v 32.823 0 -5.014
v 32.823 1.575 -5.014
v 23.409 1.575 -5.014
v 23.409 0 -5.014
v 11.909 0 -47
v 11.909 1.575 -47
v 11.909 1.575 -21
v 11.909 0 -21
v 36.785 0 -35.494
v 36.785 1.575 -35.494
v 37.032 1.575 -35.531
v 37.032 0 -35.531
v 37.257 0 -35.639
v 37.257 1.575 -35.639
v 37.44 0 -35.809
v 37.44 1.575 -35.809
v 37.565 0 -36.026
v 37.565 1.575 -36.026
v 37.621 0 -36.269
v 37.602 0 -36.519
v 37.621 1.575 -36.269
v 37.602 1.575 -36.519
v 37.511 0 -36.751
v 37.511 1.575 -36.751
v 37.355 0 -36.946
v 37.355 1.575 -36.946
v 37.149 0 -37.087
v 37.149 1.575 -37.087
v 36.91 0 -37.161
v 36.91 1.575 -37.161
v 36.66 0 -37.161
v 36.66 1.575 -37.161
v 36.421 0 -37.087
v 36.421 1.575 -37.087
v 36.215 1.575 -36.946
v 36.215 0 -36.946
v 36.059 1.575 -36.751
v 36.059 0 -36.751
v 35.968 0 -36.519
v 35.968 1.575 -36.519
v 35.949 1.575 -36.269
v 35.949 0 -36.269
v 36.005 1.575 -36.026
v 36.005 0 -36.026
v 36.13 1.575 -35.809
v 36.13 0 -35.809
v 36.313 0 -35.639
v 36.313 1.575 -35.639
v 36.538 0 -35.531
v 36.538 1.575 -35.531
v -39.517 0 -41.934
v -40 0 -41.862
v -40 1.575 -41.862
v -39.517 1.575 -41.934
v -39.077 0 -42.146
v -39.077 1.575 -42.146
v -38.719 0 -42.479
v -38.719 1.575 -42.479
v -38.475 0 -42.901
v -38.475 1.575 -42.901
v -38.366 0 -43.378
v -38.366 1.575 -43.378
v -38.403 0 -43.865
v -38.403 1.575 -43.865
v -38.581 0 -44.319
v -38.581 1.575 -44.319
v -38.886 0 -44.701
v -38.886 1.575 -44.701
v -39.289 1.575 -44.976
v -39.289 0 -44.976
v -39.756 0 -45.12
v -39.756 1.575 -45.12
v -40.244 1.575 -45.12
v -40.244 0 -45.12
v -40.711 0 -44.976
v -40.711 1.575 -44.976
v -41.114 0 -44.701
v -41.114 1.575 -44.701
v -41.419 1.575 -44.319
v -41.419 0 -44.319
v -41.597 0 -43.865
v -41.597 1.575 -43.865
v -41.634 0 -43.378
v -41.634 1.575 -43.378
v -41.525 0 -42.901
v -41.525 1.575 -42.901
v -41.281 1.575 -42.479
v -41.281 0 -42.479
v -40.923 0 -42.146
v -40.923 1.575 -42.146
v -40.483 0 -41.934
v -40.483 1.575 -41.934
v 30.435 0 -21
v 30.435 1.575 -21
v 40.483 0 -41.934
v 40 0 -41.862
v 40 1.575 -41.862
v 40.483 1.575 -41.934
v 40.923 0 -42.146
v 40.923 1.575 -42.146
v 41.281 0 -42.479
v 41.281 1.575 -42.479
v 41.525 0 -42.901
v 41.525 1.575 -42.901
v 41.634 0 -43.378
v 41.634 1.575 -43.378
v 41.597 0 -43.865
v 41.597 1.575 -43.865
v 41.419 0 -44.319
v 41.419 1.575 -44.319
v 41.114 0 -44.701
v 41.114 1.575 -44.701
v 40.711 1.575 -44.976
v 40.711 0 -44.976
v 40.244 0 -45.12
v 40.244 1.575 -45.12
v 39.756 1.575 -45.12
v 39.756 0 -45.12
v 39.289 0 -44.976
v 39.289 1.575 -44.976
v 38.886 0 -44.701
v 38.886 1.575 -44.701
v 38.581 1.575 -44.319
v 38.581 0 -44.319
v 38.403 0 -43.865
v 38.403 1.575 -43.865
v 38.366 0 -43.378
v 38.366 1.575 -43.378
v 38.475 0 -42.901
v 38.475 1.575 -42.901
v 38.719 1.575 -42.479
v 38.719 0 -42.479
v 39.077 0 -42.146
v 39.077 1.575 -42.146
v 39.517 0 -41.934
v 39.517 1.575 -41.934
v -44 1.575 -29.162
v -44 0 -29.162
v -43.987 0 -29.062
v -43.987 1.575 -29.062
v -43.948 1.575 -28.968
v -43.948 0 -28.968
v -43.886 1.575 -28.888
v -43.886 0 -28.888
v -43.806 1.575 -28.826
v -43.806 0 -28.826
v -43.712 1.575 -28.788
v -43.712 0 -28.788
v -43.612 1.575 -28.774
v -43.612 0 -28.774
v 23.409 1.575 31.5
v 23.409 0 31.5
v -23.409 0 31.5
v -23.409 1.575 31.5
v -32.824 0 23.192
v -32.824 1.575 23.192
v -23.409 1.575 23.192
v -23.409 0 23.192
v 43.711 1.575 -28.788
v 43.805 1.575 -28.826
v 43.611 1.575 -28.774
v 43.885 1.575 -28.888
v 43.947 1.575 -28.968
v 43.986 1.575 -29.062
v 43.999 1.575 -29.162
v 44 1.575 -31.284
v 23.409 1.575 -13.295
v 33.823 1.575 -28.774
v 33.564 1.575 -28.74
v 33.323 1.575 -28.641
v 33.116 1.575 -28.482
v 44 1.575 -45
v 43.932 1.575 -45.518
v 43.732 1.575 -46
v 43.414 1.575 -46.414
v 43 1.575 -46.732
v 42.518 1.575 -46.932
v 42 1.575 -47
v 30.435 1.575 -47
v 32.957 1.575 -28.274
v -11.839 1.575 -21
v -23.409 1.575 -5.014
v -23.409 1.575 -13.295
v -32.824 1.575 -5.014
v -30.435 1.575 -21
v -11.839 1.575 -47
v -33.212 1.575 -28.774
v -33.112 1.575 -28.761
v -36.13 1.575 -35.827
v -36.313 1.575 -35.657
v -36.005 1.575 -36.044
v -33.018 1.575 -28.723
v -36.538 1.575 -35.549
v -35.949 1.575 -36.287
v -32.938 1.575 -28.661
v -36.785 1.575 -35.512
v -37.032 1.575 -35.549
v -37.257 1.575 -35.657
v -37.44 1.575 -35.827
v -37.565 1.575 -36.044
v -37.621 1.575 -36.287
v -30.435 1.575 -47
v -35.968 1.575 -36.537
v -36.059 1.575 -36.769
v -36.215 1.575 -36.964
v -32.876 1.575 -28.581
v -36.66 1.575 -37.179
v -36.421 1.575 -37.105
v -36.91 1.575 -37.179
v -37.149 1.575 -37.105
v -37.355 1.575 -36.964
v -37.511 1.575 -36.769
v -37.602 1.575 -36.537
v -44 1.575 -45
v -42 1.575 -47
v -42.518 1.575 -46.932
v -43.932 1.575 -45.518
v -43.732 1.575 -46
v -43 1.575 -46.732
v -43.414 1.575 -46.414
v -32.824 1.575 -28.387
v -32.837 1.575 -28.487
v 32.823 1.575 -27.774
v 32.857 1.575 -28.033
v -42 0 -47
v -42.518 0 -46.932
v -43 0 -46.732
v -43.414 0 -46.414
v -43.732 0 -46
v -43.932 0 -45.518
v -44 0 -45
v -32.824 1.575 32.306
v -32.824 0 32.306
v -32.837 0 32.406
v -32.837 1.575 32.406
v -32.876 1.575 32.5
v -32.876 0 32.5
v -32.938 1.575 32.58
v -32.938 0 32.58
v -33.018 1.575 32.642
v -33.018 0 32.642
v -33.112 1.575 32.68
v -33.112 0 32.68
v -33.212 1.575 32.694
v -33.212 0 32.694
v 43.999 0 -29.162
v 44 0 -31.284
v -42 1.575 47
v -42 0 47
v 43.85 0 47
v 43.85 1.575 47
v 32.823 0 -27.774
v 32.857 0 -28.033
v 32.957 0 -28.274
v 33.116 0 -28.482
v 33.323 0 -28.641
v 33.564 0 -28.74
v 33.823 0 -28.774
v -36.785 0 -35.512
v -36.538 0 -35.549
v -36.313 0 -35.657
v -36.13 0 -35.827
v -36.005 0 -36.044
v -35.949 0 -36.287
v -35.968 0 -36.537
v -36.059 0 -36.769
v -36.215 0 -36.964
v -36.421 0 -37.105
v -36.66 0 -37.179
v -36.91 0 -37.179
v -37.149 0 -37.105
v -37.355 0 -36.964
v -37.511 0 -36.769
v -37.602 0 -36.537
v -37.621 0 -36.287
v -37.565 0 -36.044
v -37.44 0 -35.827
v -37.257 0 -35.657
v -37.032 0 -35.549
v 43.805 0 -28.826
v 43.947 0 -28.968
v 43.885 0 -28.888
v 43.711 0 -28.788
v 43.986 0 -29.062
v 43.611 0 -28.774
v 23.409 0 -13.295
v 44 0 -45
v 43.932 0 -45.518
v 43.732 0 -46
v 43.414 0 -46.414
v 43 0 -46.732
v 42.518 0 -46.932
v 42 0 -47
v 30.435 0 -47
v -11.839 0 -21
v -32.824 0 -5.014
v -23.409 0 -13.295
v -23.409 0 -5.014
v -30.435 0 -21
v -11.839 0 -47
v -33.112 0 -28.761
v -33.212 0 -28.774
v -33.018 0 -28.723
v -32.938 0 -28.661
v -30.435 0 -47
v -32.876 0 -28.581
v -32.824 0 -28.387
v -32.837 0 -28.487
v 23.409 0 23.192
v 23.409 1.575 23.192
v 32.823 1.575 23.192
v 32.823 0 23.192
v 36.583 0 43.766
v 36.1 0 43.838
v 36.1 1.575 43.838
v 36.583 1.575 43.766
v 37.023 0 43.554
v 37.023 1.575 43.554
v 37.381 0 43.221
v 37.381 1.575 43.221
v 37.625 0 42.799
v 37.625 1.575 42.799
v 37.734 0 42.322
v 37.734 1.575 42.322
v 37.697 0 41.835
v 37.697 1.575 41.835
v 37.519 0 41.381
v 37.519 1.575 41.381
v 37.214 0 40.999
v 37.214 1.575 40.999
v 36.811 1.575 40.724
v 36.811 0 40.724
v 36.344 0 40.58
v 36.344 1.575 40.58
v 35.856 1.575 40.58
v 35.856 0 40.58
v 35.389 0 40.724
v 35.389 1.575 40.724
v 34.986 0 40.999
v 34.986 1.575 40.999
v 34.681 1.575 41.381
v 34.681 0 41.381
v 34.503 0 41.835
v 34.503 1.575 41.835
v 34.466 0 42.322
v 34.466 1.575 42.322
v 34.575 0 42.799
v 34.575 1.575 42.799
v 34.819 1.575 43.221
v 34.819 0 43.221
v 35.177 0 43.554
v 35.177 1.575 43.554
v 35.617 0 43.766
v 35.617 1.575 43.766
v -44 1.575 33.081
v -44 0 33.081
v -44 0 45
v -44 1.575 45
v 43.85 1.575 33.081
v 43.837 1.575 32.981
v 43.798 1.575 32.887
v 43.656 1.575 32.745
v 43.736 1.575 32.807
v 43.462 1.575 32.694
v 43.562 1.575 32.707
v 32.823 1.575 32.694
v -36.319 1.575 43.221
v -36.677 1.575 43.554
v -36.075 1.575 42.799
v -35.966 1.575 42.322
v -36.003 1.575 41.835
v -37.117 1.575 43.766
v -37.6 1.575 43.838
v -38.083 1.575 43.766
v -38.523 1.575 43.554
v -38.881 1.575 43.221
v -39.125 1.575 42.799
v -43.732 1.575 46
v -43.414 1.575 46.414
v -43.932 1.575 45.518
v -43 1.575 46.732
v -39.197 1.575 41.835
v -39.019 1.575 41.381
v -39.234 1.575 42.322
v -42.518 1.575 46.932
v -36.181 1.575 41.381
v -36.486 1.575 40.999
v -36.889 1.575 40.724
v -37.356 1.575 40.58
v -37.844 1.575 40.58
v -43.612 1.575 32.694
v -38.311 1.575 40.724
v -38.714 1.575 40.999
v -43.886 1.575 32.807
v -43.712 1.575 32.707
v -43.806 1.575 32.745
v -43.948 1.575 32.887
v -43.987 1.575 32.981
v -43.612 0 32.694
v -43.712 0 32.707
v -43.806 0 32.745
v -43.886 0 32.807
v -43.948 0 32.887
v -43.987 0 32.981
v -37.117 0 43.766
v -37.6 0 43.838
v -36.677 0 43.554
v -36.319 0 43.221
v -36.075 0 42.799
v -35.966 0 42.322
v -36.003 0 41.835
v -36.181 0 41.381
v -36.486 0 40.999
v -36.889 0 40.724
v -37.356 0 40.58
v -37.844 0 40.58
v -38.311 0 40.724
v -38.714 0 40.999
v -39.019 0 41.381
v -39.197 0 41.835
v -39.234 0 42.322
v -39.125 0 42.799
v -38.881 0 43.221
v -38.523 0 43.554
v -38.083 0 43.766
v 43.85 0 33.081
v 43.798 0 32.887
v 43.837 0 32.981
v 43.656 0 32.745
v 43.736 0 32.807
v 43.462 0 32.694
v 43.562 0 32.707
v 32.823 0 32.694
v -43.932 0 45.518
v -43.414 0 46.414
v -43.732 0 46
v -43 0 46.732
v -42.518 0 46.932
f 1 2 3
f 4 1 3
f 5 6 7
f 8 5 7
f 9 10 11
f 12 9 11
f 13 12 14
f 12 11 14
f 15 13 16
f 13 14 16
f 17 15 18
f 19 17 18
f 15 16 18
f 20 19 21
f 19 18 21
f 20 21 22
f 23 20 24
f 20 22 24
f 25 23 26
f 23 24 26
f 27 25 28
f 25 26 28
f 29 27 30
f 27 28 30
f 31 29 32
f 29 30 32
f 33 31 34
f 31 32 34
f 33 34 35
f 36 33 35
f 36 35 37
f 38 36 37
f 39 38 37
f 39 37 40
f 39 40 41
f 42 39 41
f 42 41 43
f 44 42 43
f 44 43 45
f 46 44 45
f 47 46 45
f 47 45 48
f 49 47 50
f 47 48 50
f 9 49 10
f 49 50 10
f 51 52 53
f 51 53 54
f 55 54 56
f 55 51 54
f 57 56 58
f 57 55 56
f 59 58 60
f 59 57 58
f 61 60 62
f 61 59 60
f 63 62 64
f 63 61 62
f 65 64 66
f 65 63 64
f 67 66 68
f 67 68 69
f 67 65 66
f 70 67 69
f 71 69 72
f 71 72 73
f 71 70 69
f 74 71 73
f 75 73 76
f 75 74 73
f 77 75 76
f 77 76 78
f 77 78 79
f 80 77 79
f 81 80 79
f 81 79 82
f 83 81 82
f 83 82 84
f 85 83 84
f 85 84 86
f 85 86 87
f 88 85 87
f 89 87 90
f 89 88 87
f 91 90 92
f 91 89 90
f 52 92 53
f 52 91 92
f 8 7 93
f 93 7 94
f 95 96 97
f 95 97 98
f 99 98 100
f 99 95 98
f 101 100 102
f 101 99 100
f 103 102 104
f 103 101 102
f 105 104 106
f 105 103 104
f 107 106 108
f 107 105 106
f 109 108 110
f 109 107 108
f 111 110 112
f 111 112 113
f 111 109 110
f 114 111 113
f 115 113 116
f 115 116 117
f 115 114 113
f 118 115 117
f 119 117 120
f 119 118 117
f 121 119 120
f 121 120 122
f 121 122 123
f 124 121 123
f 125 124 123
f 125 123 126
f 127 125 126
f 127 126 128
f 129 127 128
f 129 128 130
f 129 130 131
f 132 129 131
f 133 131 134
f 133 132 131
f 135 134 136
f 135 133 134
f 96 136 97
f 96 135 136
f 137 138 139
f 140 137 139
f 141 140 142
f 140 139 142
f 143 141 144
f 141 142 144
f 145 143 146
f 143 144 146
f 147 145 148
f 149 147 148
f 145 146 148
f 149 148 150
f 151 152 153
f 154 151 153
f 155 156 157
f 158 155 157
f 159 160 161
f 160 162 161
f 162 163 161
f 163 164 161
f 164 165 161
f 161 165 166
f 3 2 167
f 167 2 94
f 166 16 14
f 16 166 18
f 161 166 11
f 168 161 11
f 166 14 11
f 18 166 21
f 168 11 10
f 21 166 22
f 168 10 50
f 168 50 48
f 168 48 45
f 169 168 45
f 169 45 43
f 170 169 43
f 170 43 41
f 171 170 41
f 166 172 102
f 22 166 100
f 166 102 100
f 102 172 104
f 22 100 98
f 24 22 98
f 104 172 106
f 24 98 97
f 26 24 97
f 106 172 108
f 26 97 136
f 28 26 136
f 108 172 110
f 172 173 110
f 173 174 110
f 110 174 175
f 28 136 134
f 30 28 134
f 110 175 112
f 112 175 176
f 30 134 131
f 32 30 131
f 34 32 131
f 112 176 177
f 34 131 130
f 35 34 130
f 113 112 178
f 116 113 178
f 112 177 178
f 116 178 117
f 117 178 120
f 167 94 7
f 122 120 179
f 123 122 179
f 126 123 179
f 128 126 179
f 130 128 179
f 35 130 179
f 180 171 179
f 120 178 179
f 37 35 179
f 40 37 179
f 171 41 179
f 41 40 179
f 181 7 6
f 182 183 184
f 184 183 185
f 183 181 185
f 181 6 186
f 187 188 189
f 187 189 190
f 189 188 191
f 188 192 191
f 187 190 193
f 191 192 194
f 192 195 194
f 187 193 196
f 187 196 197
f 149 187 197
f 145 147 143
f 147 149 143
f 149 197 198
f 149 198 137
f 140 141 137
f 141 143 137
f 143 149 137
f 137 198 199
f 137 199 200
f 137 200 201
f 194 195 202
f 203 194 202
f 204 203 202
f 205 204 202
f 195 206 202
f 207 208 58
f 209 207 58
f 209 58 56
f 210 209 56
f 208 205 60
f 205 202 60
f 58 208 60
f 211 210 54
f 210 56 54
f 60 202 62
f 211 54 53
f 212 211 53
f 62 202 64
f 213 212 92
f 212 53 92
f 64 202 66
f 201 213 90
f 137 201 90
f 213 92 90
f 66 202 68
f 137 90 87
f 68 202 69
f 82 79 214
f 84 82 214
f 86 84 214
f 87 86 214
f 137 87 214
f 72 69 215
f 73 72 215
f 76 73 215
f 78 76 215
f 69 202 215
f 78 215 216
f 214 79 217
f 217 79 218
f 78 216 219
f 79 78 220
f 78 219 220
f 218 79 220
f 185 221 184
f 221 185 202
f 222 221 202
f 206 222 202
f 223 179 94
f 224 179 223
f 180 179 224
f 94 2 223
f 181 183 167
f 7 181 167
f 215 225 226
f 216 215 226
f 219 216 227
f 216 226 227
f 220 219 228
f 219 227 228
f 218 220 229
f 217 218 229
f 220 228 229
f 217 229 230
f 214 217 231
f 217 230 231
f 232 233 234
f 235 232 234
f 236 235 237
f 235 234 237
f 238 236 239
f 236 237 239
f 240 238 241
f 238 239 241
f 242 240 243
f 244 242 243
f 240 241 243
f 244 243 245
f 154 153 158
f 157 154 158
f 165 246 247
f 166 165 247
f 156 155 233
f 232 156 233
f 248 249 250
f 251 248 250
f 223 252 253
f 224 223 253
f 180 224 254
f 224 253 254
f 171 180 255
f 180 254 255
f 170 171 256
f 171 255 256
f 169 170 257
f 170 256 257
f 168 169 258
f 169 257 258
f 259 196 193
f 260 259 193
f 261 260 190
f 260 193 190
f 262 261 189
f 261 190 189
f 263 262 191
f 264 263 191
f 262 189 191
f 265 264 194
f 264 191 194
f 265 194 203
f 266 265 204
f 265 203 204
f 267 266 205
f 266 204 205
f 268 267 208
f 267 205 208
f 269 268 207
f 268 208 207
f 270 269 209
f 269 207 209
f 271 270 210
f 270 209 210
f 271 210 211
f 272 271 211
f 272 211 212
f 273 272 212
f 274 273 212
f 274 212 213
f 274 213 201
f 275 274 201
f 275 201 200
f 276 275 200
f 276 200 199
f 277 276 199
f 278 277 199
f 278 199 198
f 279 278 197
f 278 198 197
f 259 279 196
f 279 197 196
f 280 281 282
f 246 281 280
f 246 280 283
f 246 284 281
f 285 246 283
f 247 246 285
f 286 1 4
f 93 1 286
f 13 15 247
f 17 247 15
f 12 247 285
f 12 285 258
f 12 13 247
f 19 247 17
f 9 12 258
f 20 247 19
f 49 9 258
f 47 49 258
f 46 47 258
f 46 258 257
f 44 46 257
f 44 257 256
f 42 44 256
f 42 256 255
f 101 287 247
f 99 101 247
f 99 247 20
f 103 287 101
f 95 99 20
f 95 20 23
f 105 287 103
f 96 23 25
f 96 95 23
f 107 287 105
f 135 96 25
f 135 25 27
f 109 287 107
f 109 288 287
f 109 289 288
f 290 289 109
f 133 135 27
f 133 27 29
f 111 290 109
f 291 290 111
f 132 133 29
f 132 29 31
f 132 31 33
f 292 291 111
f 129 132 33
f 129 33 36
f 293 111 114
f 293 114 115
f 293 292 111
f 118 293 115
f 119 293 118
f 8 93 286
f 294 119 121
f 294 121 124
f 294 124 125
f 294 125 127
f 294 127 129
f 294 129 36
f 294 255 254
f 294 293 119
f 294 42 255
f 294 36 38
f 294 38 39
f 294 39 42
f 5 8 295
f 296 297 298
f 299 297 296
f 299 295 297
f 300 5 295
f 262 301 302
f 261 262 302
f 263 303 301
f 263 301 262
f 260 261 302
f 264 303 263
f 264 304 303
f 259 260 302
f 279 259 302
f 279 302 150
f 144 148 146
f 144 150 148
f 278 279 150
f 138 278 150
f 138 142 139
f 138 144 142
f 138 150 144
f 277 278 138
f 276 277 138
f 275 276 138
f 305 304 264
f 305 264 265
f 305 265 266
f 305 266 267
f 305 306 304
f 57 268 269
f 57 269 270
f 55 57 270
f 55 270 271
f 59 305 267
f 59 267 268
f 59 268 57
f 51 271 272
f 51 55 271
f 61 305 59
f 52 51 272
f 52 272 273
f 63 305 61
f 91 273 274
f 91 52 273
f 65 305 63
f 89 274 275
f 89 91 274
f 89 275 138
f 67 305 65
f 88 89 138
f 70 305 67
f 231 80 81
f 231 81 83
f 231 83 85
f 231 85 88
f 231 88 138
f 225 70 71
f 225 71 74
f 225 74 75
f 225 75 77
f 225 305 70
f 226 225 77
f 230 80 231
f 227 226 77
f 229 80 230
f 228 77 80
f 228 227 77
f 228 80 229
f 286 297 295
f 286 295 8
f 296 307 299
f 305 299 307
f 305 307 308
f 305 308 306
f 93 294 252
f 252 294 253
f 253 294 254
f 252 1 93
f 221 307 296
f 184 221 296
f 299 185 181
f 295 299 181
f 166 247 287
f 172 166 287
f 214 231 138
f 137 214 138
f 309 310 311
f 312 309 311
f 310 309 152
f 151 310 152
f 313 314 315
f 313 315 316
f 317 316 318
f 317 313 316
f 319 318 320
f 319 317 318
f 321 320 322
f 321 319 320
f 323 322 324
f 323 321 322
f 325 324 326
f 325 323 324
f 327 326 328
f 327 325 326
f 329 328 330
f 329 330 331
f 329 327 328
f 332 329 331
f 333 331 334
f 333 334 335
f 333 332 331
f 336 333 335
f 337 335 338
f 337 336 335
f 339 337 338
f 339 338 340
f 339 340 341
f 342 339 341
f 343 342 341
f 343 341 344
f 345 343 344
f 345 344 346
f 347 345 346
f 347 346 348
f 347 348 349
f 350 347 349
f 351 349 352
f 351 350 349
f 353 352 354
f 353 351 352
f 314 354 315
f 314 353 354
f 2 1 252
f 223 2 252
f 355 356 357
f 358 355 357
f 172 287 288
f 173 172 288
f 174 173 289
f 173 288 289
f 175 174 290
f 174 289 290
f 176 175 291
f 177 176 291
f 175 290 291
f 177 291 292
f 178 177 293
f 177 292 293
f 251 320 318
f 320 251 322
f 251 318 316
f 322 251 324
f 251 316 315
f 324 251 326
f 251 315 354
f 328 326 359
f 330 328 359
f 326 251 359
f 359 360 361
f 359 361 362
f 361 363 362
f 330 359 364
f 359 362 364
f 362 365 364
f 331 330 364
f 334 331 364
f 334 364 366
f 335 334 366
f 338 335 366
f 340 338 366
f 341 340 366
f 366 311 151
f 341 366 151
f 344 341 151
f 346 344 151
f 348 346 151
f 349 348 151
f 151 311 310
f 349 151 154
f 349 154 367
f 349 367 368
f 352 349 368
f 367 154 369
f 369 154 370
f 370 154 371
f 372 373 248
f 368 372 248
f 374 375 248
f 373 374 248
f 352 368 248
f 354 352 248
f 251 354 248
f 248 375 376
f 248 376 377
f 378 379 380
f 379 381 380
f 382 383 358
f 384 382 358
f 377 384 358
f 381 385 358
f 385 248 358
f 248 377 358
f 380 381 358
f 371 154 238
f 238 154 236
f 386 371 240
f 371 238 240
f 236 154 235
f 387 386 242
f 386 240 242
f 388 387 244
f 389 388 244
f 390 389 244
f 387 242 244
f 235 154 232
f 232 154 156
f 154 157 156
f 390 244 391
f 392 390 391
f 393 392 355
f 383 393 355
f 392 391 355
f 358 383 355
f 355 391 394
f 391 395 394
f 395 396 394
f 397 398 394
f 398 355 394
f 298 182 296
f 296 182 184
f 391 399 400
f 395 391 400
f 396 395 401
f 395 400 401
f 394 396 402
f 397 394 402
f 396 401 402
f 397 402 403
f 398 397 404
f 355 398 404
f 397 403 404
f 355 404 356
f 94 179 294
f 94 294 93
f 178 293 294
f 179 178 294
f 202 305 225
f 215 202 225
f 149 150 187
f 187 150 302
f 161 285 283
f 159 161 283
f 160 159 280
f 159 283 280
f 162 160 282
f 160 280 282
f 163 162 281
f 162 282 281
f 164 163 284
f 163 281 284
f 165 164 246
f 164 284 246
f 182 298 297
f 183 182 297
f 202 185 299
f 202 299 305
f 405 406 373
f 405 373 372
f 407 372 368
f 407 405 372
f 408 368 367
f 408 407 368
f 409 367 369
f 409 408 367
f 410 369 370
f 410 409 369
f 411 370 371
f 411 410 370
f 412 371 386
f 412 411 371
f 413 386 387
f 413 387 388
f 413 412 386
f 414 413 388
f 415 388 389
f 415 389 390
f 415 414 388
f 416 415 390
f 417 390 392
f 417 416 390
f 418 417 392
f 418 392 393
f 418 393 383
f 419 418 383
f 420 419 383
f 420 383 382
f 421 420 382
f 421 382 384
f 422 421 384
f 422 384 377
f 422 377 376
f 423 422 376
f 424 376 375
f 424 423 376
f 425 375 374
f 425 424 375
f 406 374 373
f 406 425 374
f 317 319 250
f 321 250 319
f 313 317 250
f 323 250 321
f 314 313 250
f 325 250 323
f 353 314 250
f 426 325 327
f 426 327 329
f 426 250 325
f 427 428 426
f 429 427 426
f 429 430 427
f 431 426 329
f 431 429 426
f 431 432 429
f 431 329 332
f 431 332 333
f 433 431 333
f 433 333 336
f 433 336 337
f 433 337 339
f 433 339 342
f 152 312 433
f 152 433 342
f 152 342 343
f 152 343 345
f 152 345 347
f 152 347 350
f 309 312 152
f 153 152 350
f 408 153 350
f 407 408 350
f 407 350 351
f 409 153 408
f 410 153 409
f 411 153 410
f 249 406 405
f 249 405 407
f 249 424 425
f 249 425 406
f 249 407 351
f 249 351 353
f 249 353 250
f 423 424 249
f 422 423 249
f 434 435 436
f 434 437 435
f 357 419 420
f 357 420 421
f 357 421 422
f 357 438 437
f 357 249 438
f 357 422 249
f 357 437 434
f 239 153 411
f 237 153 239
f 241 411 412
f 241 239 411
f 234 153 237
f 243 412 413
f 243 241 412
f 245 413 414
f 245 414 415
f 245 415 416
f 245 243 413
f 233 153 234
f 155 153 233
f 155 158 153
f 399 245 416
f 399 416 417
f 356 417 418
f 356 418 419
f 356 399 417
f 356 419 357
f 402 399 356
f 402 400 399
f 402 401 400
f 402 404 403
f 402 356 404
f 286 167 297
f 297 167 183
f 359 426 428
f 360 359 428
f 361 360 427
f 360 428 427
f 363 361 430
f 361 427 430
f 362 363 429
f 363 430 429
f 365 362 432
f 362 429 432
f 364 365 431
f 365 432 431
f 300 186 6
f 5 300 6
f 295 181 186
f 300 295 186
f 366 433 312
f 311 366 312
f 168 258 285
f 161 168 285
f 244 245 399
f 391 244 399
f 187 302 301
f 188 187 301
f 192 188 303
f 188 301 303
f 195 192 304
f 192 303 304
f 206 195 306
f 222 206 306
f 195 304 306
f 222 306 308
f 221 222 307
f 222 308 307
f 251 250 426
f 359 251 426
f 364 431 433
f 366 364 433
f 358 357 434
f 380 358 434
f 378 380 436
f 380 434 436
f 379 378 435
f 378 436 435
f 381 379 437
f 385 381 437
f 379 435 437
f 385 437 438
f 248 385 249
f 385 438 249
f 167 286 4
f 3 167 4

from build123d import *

# Parameters (mm, degrees)
SKETCH1_R           = 1.6383
BOSS_EXTRUDE1_DEPTH = 1.575
CUT_EXTRUDE1_DEPTH  = 2.54
SKETCH15_R          = 0.8382
CUT_EXTRUDE5_DEPTH  = 1.575
BOSS_EXTRUDE2_DEPTH = 1.575
CUT_EXTRUDE7_DEPTH  = 65.400936523


with BuildPart() as part:
    # Sketch1 → Boss-Extrude1 (new body)
    with BuildSketch(Plane(origin=(0, 0, 0), x_dir=(1, 0, 0), z_dir=(0, 1, 0))):
        with BuildLine():
            Line((-44, 45), (-44, 29.162404323))
            ThreePointArc((-44, 29.162404323), (-43.886381258, 28.888104416), (-43.612081351, 28.774485674))
            Line((-43.612081351, 28.774485674), (-33.211918649, 28.774485674))
            ThreePointArc((-33.211918649, 28.774485674), (-32.937618742, 28.660866933), (-32.824, 28.386567026))
            Line((-32.824, 28.386567026), (-32.824, -32.305595677))
            ThreePointArc((-32.824, -32.305595677), (-32.937618742, -32.579895584), (-33.211918649, -32.693514326))
            Line((-33.211918649, -32.693514326), (-36.100000052, -32.693514326))
            Line((-36.100000052, -32.693514326), (-43.612081299, -32.693514326))
            ThreePointArc((-43.612081299, -32.693514326), (-43.886381206, -32.807133067), (-43.999999948, -33.081432974))
            Line((-43.999999948, -33.081432974), (-43.999999948, -38.977))
            Line((-43.999999948, -38.977), (-43.999999948, -45))
            ThreePointArc((-43.999999948, -45), (-43.41421351, -46.414213562), (-41.999999948, -47))
            Line((-41.999999948, -47), (42.705916546, -47))
            Line((42.705916546, -47), (43.849731117, -47))
            Line((43.849731117, -47), (43.849731117, -38.27))
            Line((43.849731117, -38.27), (43.849731117, -33.081432974))
            ThreePointArc((43.849731117, -33.081432974), (43.736112376, -32.807133067), (43.461812469, -32.693514326))
            Line((43.461812469, -32.693514326), (36.098785193, -32.693514326))
            Line((36.098785193, -32.693514326), (33.824, -32.693514326))
            Line((33.824, -32.693514326), (32.822785141, -32.693514326))
            Line((32.822785141, -32.693514326), (32.822785141, -30.469351623))
            Line((32.822785141, -30.469351623), (32.822785141, 27.774485674))
            ThreePointArc((32.822785141, 27.774485674), (33.11567836, 28.481592456), (33.822785141, 28.774485674))
            Line((33.822785141, 28.774485674), (43.611054239, 28.774485674))
            ThreePointArc((43.611054239, 28.774485674), (43.885287743, 28.88803803), (43.998972842, 29.162216531))
            Line((43.998972842, 29.162216531), (44, 31.284))
            Line((44, 31.284), (44, 45))
            ThreePointArc((44, 45), (43.414213562, 46.414213562), (42, 47))
            Line((42, 47), (-42, 47))
            ThreePointArc((-42, 47), (-43.414213562, 46.414213562), (-44, 45))
        make_face()
        with Locations(Location((40, 43.5, 0), (0, 0, 270))):
            Circle(SKETCH1_R, mode=Mode.SUBTRACT)
        with Locations(Location((-40, 43.5, 0), (0, 0, 270))):
            Circle(SKETCH1_R, mode=Mode.SUBTRACT)
        with Locations(Location((-37.599999948, -42.2, 0), (0, 0, 270))):
            Circle(SKETCH1_R, mode=Mode.SUBTRACT)
        with Locations(Location((36.100000052, -42.2, 0), (0, 0, 270))):
            Circle(SKETCH1_R, mode=Mode.SUBTRACT)
        Polygon((23.409, -31.5), (-23.409, -31.5), (-23.409, 13.29544), (-12.909, 13.29544), (-12.909, 25.99544), (12.909, 25.99544), (12.909, 13.29544), (23.409, 13.29544), align=None, mode=Mode.SUBTRACT)
    extrude(amount=BOSS_EXTRUDE1_DEPTH)

    # Sketch2 → Cut-Extrude1 (cut)
    with BuildSketch(Plane(origin=(0, 1.575, 0), x_dir=(1, 0, 0), z_dir=(0, 1, 0))):
        Polygon((-12.909, 19.06), (-30.435, 19.06), (-30.435, 47), (30.435, 47), (30.435, 19.06), (12.909, 19.06), (12.909, 25.99544), (-12.909, 25.99544), align=None)
    extrude(amount=-CUT_EXTRUDE1_DEPTH, mode=Mode.SUBTRACT)

    # Sketch15 → Cut-Extrude5 (cut)
    with BuildSketch(Plane(origin=(0, 1.575, 0), x_dir=(1, 0, 0), z_dir=(0, 1, 0))):
        with Locations(Location((-36.785, 36.35, 0), (0, 0, 270))):
            Circle(SKETCH15_R)
        with Locations(Location((36.785, 36.332, 0), (0, 0, 270))):
            Circle(SKETCH15_R)
    extrude(amount=-CUT_EXTRUDE5_DEPTH, mode=Mode.SUBTRACT)

    # Sketch16 → Boss-Extrude2 (add)
    with BuildSketch(Plane(origin=(0, 1.575, 0), x_dir=(1, 0, 0), z_dir=(0, 1, 0))):
        Polygon((12.909, 19.06), (12.909, 13.29544), (-12.909, 13.29544), (-12.909, 19.06), (-30.435, 19.06), (-30.435, 21), (-11.838888217, 21), (-11.838888217, 47), (11.909, 47), (11.909, 21), (30.435, 21), (30.435, 19.06), align=None)
    extrude(amount=-BOSS_EXTRUDE2_DEPTH)

    # Sketch17 → Cut-Extrude7 (cut, through all)
    with BuildSketch(Plane(origin=(0, 1.575, 0), x_dir=(1, 0, 0), z_dir=(0, 1, 0))):
        Polygon((-42.620402532, -10.524407413), (-42.620402532, -23.19180025), (43.180071614, -23.19180025), (43.180071614, -10.524407413), (43.180071614, 5.014261133), (-42.620402532, 5.014261133), align=None)
    extrude(amount=-CUT_EXTRUDE7_DEPTH, mode=Mode.SUBTRACT)


with BuildPart() as cut_extrude7_piece_1:
    # of the separate pieces the step leaves, piece 1, a body of its own (cut_extrude7_pieces)
    add(part.part.solids().sort_by_distance((-44, 0, -45))[0])


with BuildPart() as cut_extrude7_piece_2:
    # of the separate pieces the step leaves, piece 2, a body of its own (cut_extrude7_pieces)
    add(part.part.solids().sort_by_distance((-32.824, 0, 23.19180025))[0])


solid = Compound([cut_extrude7_piece_1.part, cut_extrude7_piece_2.part])
